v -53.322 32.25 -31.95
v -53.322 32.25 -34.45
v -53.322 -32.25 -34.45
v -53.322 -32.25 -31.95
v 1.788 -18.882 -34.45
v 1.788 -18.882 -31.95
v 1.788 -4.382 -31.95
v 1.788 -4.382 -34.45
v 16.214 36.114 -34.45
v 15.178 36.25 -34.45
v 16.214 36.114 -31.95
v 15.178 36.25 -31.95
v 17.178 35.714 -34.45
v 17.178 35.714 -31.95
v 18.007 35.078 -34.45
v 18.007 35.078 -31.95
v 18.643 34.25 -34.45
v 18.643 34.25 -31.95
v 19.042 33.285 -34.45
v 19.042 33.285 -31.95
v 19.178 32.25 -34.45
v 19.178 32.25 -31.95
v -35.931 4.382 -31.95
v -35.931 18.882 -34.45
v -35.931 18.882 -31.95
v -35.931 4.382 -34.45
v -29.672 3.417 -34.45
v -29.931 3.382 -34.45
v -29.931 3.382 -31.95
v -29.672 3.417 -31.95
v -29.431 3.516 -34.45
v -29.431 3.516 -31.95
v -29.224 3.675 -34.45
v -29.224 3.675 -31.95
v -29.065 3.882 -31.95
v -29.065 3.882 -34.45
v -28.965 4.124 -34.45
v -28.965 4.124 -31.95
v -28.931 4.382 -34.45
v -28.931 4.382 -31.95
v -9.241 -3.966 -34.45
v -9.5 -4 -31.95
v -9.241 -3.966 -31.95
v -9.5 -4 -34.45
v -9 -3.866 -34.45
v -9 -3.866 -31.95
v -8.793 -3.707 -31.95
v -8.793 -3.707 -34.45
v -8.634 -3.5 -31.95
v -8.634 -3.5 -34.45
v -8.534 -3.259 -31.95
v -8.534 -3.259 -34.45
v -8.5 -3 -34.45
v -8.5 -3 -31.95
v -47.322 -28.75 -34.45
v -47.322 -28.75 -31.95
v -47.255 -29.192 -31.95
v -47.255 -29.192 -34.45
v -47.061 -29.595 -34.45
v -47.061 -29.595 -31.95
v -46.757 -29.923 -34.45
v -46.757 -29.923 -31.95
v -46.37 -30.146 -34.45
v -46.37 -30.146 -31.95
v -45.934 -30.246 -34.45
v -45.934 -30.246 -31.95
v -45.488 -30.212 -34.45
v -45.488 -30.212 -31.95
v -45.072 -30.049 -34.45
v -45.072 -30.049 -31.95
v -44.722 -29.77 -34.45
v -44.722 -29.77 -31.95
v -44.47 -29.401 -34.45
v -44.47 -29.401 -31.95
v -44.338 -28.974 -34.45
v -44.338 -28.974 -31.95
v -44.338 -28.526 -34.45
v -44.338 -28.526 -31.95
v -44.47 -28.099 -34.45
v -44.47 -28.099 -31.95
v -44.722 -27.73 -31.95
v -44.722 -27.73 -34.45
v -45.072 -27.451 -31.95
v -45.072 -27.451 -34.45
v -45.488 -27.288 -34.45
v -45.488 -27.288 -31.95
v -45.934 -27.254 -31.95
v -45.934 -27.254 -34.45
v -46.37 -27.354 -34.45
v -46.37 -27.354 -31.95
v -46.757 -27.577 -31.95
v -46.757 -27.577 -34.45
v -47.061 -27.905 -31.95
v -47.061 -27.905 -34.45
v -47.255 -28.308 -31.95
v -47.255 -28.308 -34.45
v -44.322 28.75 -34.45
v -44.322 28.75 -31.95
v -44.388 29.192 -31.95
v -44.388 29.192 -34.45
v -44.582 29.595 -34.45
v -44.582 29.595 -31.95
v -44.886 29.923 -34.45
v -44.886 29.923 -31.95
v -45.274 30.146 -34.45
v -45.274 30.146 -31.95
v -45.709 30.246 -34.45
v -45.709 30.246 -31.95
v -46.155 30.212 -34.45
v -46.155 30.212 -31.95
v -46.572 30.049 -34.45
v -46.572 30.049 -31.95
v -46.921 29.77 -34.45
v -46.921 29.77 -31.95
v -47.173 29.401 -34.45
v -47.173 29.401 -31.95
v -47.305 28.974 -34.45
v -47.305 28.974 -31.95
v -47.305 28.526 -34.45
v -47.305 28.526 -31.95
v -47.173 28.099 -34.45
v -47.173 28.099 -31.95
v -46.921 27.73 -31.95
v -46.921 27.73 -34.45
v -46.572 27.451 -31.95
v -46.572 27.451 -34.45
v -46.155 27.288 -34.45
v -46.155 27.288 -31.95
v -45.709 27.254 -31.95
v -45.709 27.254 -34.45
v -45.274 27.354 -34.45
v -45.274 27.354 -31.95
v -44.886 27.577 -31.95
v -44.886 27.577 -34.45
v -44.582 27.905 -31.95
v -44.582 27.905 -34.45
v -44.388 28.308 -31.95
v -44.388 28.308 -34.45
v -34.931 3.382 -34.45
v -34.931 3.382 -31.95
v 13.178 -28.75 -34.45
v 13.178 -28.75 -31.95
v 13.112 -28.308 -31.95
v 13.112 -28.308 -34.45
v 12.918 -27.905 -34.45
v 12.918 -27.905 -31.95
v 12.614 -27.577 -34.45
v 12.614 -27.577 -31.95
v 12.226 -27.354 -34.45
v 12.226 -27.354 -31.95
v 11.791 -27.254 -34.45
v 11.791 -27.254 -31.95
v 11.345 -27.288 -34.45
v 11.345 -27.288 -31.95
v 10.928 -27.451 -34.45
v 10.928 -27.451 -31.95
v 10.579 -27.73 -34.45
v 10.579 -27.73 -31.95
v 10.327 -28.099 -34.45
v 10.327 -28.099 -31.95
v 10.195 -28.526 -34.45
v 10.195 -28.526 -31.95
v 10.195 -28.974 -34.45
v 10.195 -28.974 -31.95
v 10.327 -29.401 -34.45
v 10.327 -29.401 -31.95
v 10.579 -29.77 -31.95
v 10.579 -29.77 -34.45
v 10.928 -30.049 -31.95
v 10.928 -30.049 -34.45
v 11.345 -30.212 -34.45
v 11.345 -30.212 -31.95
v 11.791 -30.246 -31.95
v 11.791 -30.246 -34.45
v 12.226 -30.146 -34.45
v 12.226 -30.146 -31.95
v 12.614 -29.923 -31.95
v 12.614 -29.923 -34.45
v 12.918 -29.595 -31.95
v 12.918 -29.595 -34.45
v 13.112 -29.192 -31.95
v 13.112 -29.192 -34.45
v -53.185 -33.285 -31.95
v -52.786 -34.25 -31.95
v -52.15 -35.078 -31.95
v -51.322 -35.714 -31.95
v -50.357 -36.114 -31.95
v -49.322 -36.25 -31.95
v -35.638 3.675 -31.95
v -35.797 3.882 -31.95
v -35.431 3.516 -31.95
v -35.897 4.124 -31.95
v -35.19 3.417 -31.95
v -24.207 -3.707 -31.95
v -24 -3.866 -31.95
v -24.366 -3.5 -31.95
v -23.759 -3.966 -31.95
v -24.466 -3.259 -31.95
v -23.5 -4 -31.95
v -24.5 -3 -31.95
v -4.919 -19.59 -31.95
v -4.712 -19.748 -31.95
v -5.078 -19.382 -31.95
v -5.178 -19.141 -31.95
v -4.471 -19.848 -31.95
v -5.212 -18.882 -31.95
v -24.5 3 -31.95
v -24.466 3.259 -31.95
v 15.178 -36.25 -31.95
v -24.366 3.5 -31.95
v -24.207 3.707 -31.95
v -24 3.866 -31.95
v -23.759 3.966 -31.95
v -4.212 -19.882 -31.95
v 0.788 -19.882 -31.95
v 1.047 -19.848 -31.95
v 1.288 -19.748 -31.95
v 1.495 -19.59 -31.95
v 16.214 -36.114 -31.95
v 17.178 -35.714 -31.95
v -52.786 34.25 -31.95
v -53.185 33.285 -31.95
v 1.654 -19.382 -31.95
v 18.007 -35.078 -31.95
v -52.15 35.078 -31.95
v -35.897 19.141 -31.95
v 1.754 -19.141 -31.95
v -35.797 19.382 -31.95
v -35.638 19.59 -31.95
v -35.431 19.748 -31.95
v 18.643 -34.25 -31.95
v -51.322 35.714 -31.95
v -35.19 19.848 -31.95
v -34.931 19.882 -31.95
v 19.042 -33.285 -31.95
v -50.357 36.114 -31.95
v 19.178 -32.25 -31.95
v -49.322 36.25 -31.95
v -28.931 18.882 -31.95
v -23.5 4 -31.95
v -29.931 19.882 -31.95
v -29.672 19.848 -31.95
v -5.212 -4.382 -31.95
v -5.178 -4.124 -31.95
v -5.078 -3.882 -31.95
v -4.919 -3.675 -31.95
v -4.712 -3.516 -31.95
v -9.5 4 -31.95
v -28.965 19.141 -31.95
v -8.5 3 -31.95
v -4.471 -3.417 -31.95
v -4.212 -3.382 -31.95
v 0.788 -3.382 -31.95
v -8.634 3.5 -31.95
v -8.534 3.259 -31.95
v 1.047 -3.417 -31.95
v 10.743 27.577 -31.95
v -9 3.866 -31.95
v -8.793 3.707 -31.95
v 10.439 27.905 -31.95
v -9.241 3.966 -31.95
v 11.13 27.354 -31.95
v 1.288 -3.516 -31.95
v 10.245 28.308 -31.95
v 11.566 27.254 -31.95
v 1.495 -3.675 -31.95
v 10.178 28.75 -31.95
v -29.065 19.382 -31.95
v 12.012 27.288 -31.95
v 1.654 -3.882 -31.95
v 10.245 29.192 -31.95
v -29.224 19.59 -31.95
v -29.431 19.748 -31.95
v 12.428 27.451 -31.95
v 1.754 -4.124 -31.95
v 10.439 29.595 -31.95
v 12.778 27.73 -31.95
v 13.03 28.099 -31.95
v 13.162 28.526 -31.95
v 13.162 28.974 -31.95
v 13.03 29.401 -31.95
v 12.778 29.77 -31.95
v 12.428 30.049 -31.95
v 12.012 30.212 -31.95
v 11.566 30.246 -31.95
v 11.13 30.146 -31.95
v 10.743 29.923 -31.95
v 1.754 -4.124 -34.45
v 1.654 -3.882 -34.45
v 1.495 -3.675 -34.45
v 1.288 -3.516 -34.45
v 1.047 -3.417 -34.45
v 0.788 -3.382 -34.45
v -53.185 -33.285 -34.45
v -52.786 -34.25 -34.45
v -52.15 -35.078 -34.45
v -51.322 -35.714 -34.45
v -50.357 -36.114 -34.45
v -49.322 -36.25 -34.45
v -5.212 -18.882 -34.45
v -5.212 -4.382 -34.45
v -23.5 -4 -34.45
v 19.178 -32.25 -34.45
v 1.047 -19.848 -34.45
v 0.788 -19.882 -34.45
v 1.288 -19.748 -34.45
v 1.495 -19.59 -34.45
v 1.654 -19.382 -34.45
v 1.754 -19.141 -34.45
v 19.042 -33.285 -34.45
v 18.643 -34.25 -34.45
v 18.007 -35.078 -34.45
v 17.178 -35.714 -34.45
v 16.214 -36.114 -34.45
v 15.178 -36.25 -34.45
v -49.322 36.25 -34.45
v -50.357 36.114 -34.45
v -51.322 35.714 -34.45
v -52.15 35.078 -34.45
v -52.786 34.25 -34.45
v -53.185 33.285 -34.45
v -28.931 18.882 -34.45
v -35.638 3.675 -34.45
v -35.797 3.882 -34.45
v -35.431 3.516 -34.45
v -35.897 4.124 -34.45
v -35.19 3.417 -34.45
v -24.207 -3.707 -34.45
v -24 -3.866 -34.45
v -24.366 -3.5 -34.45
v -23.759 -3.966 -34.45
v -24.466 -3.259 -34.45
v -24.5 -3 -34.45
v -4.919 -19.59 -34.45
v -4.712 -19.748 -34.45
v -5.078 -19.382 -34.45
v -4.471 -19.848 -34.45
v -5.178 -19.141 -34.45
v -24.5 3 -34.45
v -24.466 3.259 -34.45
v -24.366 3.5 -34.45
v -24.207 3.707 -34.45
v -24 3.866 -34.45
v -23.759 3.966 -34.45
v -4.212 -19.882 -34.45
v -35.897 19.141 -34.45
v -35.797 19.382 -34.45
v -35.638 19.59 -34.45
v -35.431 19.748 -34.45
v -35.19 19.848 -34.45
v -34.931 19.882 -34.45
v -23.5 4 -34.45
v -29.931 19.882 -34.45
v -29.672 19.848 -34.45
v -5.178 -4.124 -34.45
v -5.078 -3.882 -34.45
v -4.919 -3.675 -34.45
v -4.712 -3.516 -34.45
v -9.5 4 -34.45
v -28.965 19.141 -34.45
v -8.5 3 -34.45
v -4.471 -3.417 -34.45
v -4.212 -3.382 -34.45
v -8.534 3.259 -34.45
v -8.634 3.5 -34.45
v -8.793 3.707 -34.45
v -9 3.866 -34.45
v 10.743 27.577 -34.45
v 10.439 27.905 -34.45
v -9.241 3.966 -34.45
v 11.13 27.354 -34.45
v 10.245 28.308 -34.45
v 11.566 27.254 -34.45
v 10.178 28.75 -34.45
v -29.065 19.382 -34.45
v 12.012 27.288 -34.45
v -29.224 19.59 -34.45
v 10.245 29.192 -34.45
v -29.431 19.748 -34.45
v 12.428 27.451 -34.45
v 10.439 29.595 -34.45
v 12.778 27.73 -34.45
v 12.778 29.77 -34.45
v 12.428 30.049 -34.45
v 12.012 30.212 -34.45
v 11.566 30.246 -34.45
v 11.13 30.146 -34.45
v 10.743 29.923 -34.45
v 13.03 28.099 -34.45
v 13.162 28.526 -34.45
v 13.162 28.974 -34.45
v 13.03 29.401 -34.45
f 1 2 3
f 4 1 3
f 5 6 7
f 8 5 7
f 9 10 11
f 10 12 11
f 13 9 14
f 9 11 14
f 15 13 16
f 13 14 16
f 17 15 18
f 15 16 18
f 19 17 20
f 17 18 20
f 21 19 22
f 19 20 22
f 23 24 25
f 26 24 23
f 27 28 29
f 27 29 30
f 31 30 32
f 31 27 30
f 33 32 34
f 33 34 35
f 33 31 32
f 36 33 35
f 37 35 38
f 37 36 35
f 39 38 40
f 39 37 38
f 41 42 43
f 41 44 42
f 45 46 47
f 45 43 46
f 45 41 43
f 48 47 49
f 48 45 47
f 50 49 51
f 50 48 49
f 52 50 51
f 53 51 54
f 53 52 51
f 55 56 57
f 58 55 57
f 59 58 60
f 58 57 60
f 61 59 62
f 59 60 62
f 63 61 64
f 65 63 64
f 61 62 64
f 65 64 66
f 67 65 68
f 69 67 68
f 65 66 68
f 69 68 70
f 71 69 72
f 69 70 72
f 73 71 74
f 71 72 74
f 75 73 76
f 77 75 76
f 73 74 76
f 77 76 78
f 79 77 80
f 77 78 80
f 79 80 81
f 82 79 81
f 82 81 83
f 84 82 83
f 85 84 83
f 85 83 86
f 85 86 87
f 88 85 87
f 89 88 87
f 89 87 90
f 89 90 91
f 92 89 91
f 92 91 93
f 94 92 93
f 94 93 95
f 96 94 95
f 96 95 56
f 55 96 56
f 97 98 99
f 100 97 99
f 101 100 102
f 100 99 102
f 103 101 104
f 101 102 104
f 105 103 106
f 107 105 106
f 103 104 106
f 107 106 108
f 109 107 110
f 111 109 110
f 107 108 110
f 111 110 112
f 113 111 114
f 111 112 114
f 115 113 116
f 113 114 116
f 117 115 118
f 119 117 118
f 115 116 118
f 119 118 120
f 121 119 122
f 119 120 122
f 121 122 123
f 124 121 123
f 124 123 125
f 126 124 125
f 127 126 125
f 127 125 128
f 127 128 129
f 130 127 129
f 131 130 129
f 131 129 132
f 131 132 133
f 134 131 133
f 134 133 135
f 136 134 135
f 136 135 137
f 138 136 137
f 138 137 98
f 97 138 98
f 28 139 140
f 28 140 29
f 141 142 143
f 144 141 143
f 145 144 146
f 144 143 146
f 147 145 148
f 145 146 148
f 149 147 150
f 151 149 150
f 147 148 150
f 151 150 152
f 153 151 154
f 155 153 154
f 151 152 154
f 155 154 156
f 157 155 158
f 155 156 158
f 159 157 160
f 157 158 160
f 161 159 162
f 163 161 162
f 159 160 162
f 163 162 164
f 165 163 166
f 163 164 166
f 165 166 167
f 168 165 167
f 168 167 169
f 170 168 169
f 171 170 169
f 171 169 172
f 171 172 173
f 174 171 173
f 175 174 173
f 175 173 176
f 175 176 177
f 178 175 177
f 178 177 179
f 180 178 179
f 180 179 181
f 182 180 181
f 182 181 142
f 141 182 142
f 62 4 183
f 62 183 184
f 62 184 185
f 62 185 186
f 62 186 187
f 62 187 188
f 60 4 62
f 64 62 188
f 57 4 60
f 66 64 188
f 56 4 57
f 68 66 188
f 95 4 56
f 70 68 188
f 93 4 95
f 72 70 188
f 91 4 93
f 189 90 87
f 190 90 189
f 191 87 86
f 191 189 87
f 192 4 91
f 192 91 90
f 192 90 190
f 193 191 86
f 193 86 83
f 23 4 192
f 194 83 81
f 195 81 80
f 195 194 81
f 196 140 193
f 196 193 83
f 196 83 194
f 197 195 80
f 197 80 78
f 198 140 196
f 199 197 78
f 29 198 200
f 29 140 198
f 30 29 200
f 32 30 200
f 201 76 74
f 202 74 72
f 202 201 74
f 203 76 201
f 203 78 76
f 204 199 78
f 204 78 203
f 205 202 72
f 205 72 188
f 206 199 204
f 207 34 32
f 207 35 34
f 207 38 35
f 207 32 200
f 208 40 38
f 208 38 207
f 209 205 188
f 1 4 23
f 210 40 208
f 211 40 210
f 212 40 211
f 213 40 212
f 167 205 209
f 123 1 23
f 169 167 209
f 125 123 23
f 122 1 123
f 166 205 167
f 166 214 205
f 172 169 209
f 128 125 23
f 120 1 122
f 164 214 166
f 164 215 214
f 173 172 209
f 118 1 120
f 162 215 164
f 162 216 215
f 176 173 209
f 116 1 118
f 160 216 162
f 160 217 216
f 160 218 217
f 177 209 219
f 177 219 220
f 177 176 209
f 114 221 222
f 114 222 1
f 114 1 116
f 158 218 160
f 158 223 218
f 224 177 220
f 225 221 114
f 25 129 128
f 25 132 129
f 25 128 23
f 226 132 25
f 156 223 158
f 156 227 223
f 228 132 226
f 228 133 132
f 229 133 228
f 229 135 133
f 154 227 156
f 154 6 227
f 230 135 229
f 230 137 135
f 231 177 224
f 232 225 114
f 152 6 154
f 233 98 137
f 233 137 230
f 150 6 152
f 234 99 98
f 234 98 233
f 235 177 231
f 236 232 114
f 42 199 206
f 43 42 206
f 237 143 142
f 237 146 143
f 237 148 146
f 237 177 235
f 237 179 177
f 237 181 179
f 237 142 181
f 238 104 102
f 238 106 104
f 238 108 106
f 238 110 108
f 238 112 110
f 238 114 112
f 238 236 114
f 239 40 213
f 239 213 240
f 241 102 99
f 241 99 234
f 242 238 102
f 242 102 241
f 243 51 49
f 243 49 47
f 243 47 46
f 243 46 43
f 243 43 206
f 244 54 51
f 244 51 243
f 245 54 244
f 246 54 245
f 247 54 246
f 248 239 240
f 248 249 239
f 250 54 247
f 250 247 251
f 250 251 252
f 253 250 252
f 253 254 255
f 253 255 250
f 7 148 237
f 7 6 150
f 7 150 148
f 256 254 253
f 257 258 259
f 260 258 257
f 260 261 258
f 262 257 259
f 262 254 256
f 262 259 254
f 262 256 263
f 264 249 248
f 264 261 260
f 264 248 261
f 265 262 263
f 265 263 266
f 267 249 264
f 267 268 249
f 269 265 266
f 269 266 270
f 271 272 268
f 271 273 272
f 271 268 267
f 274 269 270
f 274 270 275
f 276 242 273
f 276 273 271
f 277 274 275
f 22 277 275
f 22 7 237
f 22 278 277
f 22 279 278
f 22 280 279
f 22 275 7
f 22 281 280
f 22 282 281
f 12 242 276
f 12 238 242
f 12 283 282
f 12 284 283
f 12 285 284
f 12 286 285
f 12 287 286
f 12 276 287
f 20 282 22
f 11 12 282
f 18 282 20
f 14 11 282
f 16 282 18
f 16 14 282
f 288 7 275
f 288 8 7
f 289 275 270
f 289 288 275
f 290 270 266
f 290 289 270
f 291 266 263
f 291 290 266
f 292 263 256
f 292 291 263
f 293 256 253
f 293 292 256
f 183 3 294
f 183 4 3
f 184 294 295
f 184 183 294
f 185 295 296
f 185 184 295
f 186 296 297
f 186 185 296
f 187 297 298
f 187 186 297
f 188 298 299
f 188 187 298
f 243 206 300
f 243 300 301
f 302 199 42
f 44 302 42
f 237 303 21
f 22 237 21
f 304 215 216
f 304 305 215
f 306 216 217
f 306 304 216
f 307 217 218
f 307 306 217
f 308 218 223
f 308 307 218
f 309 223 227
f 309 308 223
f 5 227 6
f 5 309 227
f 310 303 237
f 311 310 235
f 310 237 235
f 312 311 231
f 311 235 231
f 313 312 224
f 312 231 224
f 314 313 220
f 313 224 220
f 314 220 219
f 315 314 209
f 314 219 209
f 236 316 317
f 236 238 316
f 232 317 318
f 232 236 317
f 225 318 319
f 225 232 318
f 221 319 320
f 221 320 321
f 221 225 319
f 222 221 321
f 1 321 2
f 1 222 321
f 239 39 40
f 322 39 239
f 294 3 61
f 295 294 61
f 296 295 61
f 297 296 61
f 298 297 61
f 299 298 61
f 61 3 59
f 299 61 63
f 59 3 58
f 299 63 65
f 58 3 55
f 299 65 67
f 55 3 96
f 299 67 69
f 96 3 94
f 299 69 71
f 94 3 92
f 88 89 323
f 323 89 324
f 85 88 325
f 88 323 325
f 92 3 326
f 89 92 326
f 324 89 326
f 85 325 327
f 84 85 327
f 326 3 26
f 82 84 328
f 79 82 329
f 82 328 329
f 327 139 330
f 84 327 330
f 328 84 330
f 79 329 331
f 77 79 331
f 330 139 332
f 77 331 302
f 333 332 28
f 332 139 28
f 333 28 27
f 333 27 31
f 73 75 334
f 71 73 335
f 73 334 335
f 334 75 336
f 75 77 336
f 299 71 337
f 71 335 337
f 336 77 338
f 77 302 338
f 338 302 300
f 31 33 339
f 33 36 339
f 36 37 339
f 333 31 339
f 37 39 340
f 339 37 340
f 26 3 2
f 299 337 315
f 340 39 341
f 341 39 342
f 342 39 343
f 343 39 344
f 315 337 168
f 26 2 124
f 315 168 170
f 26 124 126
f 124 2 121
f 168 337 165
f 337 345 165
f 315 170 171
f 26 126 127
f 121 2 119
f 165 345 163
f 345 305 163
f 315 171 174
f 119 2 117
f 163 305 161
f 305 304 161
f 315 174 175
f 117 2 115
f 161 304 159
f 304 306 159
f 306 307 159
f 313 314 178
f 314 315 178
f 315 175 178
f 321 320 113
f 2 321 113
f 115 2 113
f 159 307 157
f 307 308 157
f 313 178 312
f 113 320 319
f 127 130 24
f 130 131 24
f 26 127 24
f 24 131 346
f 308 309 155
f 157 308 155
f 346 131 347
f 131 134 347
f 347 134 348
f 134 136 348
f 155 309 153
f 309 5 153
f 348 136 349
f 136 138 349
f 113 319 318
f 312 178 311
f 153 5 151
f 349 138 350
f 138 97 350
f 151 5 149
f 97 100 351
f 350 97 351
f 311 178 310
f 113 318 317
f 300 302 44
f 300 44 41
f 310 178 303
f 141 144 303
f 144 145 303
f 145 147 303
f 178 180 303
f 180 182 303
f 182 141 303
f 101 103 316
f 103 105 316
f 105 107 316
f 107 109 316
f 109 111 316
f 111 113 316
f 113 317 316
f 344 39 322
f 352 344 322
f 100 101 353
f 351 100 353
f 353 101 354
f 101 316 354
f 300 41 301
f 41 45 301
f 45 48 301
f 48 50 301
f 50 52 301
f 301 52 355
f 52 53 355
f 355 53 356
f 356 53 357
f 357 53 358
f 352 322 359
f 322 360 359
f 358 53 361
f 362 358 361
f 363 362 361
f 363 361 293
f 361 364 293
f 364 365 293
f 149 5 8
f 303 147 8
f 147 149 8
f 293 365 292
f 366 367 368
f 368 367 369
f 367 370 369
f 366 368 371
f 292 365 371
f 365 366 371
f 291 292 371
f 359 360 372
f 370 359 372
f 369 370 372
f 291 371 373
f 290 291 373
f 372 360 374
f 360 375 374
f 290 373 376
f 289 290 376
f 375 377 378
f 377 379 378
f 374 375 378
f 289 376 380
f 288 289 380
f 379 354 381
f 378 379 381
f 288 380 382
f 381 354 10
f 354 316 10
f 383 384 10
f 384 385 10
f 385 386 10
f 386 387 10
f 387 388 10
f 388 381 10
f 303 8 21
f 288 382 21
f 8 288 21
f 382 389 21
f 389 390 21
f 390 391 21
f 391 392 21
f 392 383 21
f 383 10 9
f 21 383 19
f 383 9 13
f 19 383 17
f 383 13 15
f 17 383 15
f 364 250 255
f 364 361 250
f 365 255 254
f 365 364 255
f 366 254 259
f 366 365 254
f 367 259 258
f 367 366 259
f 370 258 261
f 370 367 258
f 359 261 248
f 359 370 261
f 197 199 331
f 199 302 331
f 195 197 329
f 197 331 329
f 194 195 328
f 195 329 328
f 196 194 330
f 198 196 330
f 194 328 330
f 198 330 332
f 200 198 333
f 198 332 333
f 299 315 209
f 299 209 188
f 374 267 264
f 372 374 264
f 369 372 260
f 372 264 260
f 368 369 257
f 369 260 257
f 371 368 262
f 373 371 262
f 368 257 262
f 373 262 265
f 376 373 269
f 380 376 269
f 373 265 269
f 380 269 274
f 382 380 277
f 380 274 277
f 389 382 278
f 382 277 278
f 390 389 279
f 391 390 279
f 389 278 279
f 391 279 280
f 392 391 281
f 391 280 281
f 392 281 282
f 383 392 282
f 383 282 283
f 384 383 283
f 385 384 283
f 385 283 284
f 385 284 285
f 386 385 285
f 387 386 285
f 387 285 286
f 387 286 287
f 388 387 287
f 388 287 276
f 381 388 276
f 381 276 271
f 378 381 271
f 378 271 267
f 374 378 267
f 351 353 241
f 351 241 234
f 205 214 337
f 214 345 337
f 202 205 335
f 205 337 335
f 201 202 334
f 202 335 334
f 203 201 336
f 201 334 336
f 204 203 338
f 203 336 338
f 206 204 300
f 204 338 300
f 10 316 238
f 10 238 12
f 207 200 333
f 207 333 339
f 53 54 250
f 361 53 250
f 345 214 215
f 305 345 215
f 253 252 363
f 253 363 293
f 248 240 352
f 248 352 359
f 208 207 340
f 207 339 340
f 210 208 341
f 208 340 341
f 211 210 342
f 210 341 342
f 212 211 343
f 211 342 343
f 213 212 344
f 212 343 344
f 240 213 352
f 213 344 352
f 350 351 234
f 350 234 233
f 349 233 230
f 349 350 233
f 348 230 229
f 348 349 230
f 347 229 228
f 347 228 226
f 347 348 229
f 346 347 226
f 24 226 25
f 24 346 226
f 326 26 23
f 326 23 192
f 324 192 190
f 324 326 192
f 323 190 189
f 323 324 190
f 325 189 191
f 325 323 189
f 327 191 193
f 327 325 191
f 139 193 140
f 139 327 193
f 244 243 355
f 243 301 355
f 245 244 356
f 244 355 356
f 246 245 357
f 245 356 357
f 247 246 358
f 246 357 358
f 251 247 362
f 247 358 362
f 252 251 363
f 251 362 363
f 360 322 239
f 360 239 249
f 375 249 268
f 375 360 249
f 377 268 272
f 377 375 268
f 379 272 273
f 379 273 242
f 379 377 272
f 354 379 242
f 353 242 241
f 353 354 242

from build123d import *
from build123d.topology import SkipClean

# Parameters (mm, degrees)
SKETCH1_R                = 1.5
BOSS_EXTRUDE1_DEPTH      = 2.5
BOSS_EXTRUDE2_DEPTH      = 1.8
BOSS_EXTRUDE2_DEPTH_BACK = 2.5
SKETCH2_R                = 4.5
SKETCH2_R_2              = 1.5
SKETCH4_R                = 2.5
CUT_EXTRUDE1_DEPTH       = 2
BOSS_EXTRUDE3_START      = 0.75
SKETCH5_R                = 4.5
SKETCH5_R_2              = 2.5
BOSS_EXTRUDE3_DEPTH      = 0.75
BOSS_EXTRUDE4_DEPTH      = 2.5
CUT_EXTRUDE2_REACH       = 80.314
SKETCH7_R                = 1.5
SKETCH7_W                = 7
SKETCH7_H                = 16.5
SKETCH7_W_2              = 16
SKETCH7_H_2              = 8
CUT_EXTRUDE3_REACH       = 82.041
SKETCH9_W                = 2.5
SKETCH9_H                = 22.388822383
BOSS_EXTRUDE5_DEPTH      = 12.5
FILLET1_R                = 4
FILLET2_R                = 1
FILLET3_R                = 4
CUT_EXTRUDE4_DEPTH       = 74.103052287
CUT_EXTRUDE4_DEPTH_BACK  = 74.103052287
SKETCH10_W               = 26.624352611
SKETCH10_H               = 48.524798022
CIRPATTERN1_START        = -34.45
CIRPATTERN1_DEPTH        = 2.5


# Read off the part's stored shape, not the designer's step: CirPattern1
with BuildPart() as part:
    # Sketch1 → Boss-Extrude1 (new body)
    with BuildSketch(Plane(origin=(0, 0, 0), x_dir=(0, 0, -1), z_dir=(1, 0, 0))):
        with BuildLine():
            Line((0, 12.5), (34.45, 12.5))
            Line((34.45, 12.5), (34.45, -12.5))
            Line((34.45, -12.5), (0, -12.5))
            ThreePointArc((0, -12.5), (-12.5, 0), (0, 12.5))
        make_face()
        Circle(SKETCH1_R, mode=Mode.SUBTRACT)
    extrude(amount=BOSS_EXTRUDE1_DEPTH)

    # Sketch2 → Boss-Extrude2 (add, two sides: drawn at the far end of the back side and taken through both)
    with BuildSketch(Plane.ZY.offset(-BOSS_EXTRUDE2_DEPTH_BACK)):
        Circle(SKETCH2_R)
        Circle(SKETCH2_R_2, mode=Mode.SUBTRACT)
    extrude(amount=BOSS_EXTRUDE2_DEPTH + BOSS_EXTRUDE2_DEPTH_BACK)

    # Sketch4 → Cut-Extrude1 (cut)
    with BuildSketch(Plane(origin=(2.5, 0, 0), x_dir=(0, 0, -1), z_dir=(1, 0, 0))):
        Circle(SKETCH4_R)
    extrude(amount=-CUT_EXTRUDE1_DEPTH, mode=Mode.SUBTRACT)

    # Sketch5 → Boss-Extrude3 (add)
    with SkipClean():  # the faces are left unmerged after this step: merging them gives an invalid solid
        with BuildSketch(Plane(origin=(2.5, 0, 0), x_dir=(0, 0, -1), z_dir=(1, 0, 0)).offset(BOSS_EXTRUDE3_START)):
            with Locations(Location((0, 0, 0), (0, 0, 180))):
                Circle(SKETCH5_R)
            Circle(SKETCH5_R_2, mode=Mode.SUBTRACT)
        extrude(amount=-BOSS_EXTRUDE3_DEPTH)

    # Sketch6 → Boss-Extrude4 (add)
    with SkipClean():  # the faces are left unmerged after this step: merging them gives an invalid solid
        with BuildSketch(Plane(origin=(0, 0, -34.45), x_dir=(-1, 0, 0), z_dir=(0, 0, -1))):
            Polygon((-8.812505246, 36.25), (53.321583376, 36.25), (53.321583376, -36.25), (6.25, -36.25), (-19.178416624, -36.25), (-19.178416624, 36.25), align=None)
        extrude(amount=-BOSS_EXTRUDE4_DEPTH)
    add(part.part.scale(1), mode=Mode.REPLACE)  # the faces are merged on a copy

    # Sketch7 → Cut-Extrude2 (cut, up to next)
    with BuildSketch(Plane.XY.offset(-31.95), mode=Mode.PRIVATE) as cut_extrude2_sk1:
        with Locations((11.678416624, -28.75)):
            Circle(SKETCH7_R)
    cut_extrude2_tool1 = extrude(cut_extrude2_sk1.sketch, amount=-CUT_EXTRUDE2_REACH, mode=Mode.PRIVATE) & part.part
    # Sketch7 → Cut-Extrude2 (cut, up to next)
    with BuildSketch(Plane.XY.offset(-31.95), mode=Mode.PRIVATE) as cut_extrude2_sk2:
        with Locations(Location((11.678416624, 28.75, 0), (0, 0, 180))):
            Circle(SKETCH7_R)
    cut_extrude2_tool2 = extrude(cut_extrude2_sk2.sketch, amount=-CUT_EXTRUDE2_REACH, mode=Mode.PRIVATE) & part.part
    # Sketch7 → Cut-Extrude2 (cut, up to next)
    with BuildSketch(Plane.XY.offset(-31.95), mode=Mode.PRIVATE) as cut_extrude2_sk3:
        with Locations((-45.821583376, 28.75)):
            Circle(SKETCH7_R)
    cut_extrude2_tool3 = extrude(cut_extrude2_sk3.sketch, amount=-CUT_EXTRUDE2_REACH, mode=Mode.PRIVATE) & part.part
    # Sketch7 → Cut-Extrude2 (cut, up to next)
    with BuildSketch(Plane.XY.offset(-31.95), mode=Mode.PRIVATE) as cut_extrude2_sk4:
        with Locations(Location((-45.821583376, -28.75, 0), (0, 0, 180))):
            Circle(SKETCH7_R)
    cut_extrude2_tool4 = extrude(cut_extrude2_sk4.sketch, amount=-CUT_EXTRUDE2_REACH, mode=Mode.PRIVATE) & part.part
    # Sketch7 → Cut-Extrude2 (cut, up to next)
    with BuildSketch(Plane.XY.offset(-31.95), mode=Mode.PRIVATE) as cut_extrude2_sk5:
        with Locations((-1.711858899, -11.632438111)):
            Rectangle(SKETCH7_W, SKETCH7_H)
    cut_extrude2_tool5 = extrude(cut_extrude2_sk5.sketch, amount=-CUT_EXTRUDE2_REACH, mode=Mode.PRIVATE) & part.part
    # Sketch7 → Cut-Extrude2 (cut, up to next)
    with BuildSketch(Plane.XY.offset(-31.95), mode=Mode.PRIVATE) as cut_extrude2_sk6:
        with Locations((-16.5, 0)):
            Rectangle(SKETCH7_W_2, SKETCH7_H_2)
    cut_extrude2_tool6 = extrude(cut_extrude2_sk6.sketch, amount=-CUT_EXTRUDE2_REACH, mode=Mode.PRIVATE) & part.part
    add(cut_extrude2_tool1.solids().sort_by_distance((11.678417, -28.75, -31.95))[0], mode=Mode.SUBTRACT)
    add(cut_extrude2_tool2.solids().sort_by_distance((11.678417, 28.75, -31.95))[0], mode=Mode.SUBTRACT)
    add(cut_extrude2_tool3.solids().sort_by_distance((-45.821583, 28.75, -31.95))[0], mode=Mode.SUBTRACT)
    add(cut_extrude2_tool4.solids().sort_by_distance((-45.821583, -28.75, -31.95))[0], mode=Mode.SUBTRACT)
    add(cut_extrude2_tool5.solids().sort_by_distance((-1.711859, -11.632438, -31.95))[0], mode=Mode.SUBTRACT)
    add(cut_extrude2_tool6.solids().sort_by_distance((-16.5, 0, -31.95))[0], mode=Mode.SUBTRACT)

    # Sketch9 → Cut-Extrude3 (cut, up to next)
    with BuildSketch(Plane.XZ.offset(12.5), mode=Mode.PRIVATE) as cut_extrude3_sk1:
        with Locations((1.25, -20.755588809)):
            Rectangle(SKETCH9_W, SKETCH9_H)
    cut_extrude3_tool1 = extrude(cut_extrude3_sk1.sketch, amount=-CUT_EXTRUDE3_REACH, mode=Mode.PRIVATE) & part.part
    add(cut_extrude3_tool1.solids().sort_by_distance((1.25, -12.5, -20.755589))[0], mode=Mode.SUBTRACT)


with BuildPart() as cut_extrude3_piece_1:
    # of the separate pieces the step leaves, piece 1, a body of its own (cut_extrude3_pieces)
    add(part.part.solids().sort_by_distance((-53.321583376, 36.25, -31.95))[0])



with BuildPart() as cut_extrude3_piece_2:
    # of the separate pieces the step leaves, piece 2, a body of its own (cut_extrude3_pieces)
    add(part.part.solids().sort_by_distance((0, 12.5, 0))[0])


with BuildPart() as cut_extrude3_piece_1_1:
    add(cut_extrude3_piece_1.part)

    add(cut_extrude3_piece_2.part)  # Boss-Extrude5 merges Cut-Extrude3 piece 2
    # Sketch8 → Boss-Extrude5 (add, symmetric)
    with BuildSketch(Plane(origin=(0, 0, 0), x_dir=(1, 0, 0), z_dir=(0, 1, 0))):
        with BuildLine():
            Line((13.243344962, 31.95), (10.743344962, 31.95))
            Line((10.743344962, 31.95), (10.743344962, 24.009277686))
            ThreePointArc((10.743344962, 24.009277686), (9.553562393, 20.771648442), (6.550447712, 19.074849133))
            ThreePointArc((6.550447712, 19.074849133), (1.858764487, 16.423986378), (0, 11.365927519))
            Line((0, 11.365927519), (0, 9.071657281))
            Line((0, 9.071657281), (2.5, 9.071657281))
            Line((2.5, 9.071657281), (2.5, 11.666723736))
            ThreePointArc((2.5, 11.666723736), (3.641866376, 14.847101848), (6.545921975, 16.574853229))
            ThreePointArc((6.545921975, 16.574853229), (11.35315475, 19.434889059), (13.243344962, 24.69953272))
            Line((13.243344962, 24.69953272), (13.243344962, 31.95))
        make_face()
    extrude(amount=BOSS_EXTRUDE5_DEPTH, both=True)

    # Fillet1
    fillet1_edges = [cut_extrude3_piece_1_1.edges().sort_by_distance(p)[0] for p in [
        (11.993344962, -12.5, -31.95),
        (13.243344962, 0, -31.95),
        (10.743344962, 0, -31.95),
        (11.993344962, 12.5, -31.95),
    ]]
    fillet(fillet1_edges, radius=FILLET1_R)

    # Fillet2
    fillet2_edges = [cut_extrude3_piece_1_1.edges().sort_by_distance(p)[0] for p in [
        (-5.211858899, -19.882438111, -33.2),
        (-5.211858899, -3.382438111, -33.2),
        (1.788141101, -3.382438111, -33.2),
        (1.788141101, -19.882438111, -33.2),
        (-8.5, 4, -33.2),
        (-8.5, -4, -33.2),
        (-24.5, -4, -33.2),
        (-24.5, 4, -33.2),
    ]]
    fillet(fillet2_edges, radius=FILLET2_R)

    # Fillet3
    fillet3_edges = [cut_extrude3_piece_1_1.edges().sort_by_distance(p)[0] for p in [
        (19.178416624, 36.25, -33.2),
        (-53.321583376, 36.25, -33.2),
        (-53.321583376, -36.25, -33.2),
        (19.178416624, -36.25, -33.2),
    ]]
    fillet(fillet3_edges, radius=FILLET3_R)

    # Sketch10 → Cut-Extrude4 (cut, two sides: drawn at the far end of the back side and taken through both)
    with BuildSketch(Plane(origin=(0, 0, 0), x_dir=(1, 0, 0), z_dir=(0, 1, 0)).offset(-CUT_EXTRUDE4_DEPTH_BACK)):
        with Locations((4.711977851, 7.687600989)):
            Rectangle(SKETCH10_W, SKETCH10_H)
    extrude(amount=CUT_EXTRUDE4_DEPTH + CUT_EXTRUDE4_DEPTH_BACK, mode=Mode.SUBTRACT)

    # CirPattern1 outline → CirPattern1 (cut)
    with BuildSketch(Plane.XY.offset(CIRPATTERN1_START)):
        with BuildLine():
            ThreePointArc((-28.931307853, 18.882438111), (-29.224201072, 19.589544892), (-29.931307853, 19.882438111))
            Line((-29.931307853, 19.882438111), (-34.931307853, 19.882438111))
            ThreePointArc((-34.931307853, 19.882438111), (-35.638414634, 19.589544892), (-35.931307853, 18.882438111))
            Line((-35.931307853, 18.882438111), (-35.931307853, 4.382438111))
            ThreePointArc((-35.931307853, 4.382438111), (-35.638414634, 3.67533133), (-34.931307853, 3.382438111))
            Line((-34.931307853, 3.382438111), (-29.931307853, 3.382438111))
            ThreePointArc((-29.931307853, 3.382438111), (-29.224201072, 3.67533133), (-28.931307853, 4.382438111))
            Line((-28.931307853, 4.382438111), (-28.931307853, 18.882438111))
        make_face()
    extrude(amount=CIRPATTERN1_DEPTH, mode=Mode.SUBTRACT)


solid = cut_extrude3_piece_1_1.part
